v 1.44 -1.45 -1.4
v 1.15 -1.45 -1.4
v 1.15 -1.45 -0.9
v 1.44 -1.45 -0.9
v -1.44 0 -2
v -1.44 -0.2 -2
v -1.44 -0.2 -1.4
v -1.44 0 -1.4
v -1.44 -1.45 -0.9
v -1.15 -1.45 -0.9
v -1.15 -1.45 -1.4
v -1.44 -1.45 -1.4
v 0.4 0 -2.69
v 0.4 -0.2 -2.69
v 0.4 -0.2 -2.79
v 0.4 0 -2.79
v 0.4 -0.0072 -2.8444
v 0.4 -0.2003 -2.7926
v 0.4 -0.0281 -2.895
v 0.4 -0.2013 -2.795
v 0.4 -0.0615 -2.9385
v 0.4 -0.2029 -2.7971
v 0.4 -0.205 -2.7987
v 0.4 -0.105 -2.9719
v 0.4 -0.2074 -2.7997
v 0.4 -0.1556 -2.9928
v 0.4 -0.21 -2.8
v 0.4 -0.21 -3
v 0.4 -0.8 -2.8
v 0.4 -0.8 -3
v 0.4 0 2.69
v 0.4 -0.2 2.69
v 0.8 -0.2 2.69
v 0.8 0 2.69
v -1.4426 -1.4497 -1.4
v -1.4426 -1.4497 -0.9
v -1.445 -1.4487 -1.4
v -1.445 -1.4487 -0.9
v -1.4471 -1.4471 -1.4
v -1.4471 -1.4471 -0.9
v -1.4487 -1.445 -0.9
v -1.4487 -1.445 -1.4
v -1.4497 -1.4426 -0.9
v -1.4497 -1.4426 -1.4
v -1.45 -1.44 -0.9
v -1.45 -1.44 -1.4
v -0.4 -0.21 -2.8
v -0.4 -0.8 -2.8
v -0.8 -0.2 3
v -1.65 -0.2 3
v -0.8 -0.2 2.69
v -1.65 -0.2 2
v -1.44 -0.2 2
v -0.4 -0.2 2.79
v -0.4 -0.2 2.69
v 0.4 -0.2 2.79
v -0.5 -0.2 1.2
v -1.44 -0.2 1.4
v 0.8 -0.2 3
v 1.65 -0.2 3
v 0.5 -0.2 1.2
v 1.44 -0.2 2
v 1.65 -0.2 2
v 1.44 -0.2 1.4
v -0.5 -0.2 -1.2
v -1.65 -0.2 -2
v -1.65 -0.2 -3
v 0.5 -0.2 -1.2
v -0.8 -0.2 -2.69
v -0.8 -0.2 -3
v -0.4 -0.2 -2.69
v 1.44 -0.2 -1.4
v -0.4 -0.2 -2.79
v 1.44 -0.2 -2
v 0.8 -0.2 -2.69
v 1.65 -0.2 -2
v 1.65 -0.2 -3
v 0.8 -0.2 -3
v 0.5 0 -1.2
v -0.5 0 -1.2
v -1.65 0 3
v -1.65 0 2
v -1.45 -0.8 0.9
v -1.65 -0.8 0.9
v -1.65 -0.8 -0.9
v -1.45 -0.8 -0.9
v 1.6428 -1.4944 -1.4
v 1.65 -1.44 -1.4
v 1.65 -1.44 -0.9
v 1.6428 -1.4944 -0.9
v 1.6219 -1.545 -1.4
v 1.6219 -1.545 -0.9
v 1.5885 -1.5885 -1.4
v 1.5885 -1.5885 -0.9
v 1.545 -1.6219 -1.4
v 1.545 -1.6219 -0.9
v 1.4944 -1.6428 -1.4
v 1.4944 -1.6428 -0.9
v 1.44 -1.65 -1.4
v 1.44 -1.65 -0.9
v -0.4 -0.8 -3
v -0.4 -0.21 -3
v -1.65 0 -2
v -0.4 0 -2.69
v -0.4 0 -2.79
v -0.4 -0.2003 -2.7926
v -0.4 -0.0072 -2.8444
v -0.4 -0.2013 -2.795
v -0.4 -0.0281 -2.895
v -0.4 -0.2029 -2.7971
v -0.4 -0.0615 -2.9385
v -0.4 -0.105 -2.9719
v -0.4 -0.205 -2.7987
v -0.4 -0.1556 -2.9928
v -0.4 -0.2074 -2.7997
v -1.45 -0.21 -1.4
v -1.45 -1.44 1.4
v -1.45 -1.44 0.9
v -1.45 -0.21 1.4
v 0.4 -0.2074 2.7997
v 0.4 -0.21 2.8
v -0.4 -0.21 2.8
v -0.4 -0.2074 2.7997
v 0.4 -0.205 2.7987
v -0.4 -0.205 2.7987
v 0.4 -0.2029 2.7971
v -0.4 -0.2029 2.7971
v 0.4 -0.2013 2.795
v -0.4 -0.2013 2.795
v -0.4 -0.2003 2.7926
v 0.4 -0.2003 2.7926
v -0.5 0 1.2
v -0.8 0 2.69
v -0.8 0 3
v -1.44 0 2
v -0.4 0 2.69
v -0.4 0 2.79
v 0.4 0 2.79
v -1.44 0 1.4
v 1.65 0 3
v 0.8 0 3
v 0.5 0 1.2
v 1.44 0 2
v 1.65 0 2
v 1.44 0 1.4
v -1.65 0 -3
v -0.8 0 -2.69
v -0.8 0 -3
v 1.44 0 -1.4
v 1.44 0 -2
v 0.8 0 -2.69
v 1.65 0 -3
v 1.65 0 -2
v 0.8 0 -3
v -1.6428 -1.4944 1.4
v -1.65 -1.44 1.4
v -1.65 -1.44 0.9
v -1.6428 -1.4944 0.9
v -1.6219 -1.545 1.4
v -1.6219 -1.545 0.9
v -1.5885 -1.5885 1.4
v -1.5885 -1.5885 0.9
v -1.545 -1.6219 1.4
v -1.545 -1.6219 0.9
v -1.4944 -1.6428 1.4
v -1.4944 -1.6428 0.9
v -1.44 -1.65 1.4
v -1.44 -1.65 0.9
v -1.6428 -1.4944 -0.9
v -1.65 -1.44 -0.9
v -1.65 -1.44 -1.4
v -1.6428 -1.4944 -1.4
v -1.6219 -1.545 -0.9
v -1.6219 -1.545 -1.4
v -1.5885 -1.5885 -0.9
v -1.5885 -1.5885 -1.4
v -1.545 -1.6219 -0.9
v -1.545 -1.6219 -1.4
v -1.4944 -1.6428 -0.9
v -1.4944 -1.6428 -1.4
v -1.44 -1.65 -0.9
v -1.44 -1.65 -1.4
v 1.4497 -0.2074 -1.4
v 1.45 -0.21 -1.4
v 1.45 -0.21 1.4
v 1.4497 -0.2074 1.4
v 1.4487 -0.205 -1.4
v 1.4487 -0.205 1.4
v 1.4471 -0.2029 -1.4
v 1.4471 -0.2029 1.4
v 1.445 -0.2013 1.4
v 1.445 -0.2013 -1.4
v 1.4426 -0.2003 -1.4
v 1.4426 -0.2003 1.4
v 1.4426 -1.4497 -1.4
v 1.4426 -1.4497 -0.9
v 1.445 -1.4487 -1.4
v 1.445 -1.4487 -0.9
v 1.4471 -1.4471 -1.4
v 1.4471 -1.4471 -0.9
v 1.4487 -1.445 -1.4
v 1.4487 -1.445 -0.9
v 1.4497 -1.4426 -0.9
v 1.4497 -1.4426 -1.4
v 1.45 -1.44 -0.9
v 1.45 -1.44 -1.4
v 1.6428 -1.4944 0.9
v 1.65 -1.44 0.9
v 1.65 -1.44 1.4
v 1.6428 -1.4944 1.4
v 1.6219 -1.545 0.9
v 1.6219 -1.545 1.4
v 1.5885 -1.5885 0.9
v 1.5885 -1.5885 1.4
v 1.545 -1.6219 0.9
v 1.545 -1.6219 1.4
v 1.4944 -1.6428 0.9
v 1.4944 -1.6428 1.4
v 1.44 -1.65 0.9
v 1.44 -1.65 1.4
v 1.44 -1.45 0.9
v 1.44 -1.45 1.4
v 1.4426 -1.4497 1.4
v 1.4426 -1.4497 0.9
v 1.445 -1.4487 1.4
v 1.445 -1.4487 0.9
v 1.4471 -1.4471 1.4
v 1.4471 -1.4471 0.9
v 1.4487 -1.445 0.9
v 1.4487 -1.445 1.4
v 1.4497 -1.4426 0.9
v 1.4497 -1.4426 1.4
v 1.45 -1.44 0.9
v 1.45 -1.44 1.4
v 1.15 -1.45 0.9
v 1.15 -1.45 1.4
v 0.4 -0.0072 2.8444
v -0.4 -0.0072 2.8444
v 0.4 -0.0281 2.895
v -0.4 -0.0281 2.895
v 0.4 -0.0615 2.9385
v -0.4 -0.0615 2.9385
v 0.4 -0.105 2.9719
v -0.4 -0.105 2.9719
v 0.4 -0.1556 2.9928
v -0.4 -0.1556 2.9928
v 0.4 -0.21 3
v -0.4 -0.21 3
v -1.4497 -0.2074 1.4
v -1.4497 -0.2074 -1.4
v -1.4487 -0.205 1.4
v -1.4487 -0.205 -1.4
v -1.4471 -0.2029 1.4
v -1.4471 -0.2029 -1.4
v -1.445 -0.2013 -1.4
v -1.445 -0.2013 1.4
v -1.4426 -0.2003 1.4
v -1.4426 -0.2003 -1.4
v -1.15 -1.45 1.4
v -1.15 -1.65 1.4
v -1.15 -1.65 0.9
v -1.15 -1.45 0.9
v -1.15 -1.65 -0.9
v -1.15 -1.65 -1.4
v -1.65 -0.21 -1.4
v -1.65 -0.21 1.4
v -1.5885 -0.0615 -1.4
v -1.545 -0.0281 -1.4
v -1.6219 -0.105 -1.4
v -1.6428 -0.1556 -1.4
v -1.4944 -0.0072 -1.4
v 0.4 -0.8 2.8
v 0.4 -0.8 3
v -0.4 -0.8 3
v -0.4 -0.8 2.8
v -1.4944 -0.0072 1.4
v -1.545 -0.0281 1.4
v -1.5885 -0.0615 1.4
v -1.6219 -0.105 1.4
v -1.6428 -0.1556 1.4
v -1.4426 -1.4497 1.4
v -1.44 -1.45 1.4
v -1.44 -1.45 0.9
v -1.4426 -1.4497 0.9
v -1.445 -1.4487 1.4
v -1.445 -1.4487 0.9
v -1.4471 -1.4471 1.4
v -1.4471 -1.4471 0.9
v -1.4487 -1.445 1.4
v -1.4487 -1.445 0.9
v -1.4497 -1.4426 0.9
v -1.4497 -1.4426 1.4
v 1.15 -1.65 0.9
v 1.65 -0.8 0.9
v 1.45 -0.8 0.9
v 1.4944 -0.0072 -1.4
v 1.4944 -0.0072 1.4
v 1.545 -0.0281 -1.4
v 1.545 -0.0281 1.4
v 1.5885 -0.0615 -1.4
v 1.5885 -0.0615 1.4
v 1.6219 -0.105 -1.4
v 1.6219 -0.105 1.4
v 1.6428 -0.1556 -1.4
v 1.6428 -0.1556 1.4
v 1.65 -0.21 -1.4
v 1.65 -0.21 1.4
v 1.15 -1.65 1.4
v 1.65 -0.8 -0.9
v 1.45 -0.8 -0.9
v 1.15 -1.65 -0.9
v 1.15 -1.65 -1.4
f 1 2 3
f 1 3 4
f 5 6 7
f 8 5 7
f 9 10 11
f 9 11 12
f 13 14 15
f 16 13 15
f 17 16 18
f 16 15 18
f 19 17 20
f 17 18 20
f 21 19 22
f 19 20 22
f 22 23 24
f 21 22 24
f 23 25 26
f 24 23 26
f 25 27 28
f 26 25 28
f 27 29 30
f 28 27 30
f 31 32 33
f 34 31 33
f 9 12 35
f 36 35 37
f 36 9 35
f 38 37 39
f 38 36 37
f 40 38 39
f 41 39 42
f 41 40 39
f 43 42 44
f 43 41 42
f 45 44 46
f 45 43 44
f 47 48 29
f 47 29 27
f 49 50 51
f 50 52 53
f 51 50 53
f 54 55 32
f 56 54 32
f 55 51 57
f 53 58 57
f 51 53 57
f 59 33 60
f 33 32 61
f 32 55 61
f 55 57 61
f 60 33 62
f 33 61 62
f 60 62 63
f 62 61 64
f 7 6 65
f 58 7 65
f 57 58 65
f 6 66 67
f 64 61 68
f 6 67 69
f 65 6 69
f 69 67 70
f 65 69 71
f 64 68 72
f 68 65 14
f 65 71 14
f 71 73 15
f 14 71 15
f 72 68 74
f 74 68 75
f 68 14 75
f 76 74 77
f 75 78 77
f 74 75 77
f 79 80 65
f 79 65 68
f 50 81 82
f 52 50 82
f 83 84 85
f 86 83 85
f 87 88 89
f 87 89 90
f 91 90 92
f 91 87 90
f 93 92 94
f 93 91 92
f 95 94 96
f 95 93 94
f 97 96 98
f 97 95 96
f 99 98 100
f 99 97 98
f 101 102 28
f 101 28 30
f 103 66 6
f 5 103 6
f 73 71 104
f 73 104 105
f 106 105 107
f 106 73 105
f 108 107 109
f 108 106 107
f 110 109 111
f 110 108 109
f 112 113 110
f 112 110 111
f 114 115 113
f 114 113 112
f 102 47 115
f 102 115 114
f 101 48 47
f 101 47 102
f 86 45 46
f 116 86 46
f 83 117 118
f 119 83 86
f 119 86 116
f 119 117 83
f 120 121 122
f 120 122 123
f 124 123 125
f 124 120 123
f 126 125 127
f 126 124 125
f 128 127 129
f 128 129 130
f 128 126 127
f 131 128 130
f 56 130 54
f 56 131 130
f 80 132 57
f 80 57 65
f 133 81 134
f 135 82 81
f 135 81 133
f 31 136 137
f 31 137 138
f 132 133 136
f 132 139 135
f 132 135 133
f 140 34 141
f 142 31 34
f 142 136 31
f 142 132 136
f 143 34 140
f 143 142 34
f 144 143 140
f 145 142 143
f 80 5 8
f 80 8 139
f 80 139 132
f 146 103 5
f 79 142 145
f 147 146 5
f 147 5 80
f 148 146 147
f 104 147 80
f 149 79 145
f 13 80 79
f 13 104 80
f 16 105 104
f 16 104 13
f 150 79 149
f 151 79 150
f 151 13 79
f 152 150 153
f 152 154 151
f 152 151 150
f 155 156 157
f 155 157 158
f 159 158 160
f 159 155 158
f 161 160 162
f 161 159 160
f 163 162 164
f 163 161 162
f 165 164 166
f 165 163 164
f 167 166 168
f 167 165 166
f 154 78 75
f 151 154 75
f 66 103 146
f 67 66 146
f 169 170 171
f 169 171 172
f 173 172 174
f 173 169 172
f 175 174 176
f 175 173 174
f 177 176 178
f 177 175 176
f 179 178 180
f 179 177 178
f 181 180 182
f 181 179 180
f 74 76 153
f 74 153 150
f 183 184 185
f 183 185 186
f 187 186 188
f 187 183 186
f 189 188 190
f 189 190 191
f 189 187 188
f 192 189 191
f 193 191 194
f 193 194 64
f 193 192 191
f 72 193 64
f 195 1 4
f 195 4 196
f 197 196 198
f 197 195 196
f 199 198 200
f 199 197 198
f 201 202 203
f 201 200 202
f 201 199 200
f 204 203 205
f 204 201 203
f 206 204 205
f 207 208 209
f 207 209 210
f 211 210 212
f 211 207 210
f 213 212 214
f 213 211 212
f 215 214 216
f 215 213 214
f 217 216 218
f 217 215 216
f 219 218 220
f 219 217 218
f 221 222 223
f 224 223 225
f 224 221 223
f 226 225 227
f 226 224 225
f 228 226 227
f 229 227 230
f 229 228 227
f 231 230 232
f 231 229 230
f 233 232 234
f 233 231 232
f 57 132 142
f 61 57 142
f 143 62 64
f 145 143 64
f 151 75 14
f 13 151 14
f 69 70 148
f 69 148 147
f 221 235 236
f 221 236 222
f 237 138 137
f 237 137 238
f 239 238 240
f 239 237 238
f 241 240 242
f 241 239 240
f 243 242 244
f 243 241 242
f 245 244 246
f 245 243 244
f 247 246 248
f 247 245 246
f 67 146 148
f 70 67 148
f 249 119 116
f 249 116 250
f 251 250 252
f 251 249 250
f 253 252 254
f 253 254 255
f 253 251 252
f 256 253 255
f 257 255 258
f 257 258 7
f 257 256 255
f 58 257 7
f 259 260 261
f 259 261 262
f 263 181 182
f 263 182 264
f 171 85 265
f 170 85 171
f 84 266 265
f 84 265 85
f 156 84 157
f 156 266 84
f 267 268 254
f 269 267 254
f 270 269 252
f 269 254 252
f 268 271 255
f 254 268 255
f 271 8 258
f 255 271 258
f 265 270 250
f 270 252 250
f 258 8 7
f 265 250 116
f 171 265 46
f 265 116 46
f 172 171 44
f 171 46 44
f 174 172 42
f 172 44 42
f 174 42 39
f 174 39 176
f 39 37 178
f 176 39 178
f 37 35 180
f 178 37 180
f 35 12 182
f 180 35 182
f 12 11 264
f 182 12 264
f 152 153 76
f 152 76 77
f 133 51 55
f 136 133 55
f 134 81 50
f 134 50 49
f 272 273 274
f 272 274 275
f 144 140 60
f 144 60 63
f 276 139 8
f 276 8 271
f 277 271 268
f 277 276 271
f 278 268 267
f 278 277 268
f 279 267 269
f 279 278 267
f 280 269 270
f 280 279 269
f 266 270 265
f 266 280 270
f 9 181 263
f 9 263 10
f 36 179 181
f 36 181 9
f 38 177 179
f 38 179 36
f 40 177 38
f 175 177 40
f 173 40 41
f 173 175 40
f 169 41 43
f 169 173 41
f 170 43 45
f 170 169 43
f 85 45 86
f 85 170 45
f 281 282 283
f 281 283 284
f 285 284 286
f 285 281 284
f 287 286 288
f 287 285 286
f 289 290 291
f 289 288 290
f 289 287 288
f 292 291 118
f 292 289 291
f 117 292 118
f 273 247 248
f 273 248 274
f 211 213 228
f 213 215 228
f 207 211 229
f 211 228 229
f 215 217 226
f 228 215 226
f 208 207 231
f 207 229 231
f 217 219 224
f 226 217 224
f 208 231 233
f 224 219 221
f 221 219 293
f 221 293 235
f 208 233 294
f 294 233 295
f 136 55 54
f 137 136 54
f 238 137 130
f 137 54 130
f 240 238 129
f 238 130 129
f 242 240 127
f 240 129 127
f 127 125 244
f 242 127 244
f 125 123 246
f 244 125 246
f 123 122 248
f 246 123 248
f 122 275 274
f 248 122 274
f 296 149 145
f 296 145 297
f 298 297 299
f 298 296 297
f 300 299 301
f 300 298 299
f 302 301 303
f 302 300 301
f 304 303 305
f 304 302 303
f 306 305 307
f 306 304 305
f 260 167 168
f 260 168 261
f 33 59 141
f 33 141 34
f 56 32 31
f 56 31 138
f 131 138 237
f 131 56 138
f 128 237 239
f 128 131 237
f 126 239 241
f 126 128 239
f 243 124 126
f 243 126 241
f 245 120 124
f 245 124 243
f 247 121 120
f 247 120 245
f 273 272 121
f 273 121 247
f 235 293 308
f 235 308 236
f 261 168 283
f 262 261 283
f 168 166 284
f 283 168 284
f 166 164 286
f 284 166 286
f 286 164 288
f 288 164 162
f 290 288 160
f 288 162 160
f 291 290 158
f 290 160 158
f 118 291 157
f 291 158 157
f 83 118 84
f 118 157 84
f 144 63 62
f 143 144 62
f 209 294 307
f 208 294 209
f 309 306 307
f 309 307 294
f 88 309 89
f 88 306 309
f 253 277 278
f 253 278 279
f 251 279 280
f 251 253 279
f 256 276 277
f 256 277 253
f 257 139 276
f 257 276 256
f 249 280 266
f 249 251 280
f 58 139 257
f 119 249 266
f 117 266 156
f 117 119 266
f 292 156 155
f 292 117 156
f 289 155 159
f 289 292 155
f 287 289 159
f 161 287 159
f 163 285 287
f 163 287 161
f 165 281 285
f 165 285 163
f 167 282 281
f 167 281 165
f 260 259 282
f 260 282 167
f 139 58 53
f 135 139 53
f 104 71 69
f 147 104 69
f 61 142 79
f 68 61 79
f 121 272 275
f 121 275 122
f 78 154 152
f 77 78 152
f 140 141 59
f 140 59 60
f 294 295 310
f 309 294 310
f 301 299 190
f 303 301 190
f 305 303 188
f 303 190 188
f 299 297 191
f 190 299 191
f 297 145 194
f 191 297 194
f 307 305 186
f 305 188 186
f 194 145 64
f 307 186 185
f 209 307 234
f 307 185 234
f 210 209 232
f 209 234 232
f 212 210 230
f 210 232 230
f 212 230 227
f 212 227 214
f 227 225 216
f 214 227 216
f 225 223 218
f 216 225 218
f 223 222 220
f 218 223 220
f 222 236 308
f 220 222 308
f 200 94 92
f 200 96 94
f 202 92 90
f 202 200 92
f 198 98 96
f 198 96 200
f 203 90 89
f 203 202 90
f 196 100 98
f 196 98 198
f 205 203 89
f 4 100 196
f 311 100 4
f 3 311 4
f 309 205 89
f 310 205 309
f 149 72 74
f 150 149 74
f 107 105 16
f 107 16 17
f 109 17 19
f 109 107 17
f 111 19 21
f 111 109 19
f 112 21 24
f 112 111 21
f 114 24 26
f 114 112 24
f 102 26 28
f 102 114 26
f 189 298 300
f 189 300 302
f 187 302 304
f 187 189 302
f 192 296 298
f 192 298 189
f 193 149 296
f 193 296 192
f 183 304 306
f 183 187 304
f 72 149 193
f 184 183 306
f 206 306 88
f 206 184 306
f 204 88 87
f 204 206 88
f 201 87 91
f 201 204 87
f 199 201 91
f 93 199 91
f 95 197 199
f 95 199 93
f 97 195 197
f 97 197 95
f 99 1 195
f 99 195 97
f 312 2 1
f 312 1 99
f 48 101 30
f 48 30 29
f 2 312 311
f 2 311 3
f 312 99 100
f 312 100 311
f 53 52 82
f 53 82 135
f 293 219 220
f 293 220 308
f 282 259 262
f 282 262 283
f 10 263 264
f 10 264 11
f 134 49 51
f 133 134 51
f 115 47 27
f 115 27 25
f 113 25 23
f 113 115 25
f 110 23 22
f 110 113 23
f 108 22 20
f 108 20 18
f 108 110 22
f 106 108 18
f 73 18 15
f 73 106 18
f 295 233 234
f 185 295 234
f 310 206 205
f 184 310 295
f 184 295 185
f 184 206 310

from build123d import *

# Parameters (mm, degrees)
SKETCH1_W                       = 3.3
SKETCH1_H                       = 6
BASE_FLANGE1_DEPTH              = 0.2
EDGE_FLANGE1_STRIP_W            = 0.82
EDGE_FLANGE1_STRIP_H            = 0.2
EDGE_FLANGE1_STRIP_CUT_DEPTH    = 0.8
EDGE_FLANGE1_RELIEF_W           = 0.92
EDGE_FLANGE1_RELIEF_H           = 0.4
EDGE_FLANGE1_RELIEF_CUT_DEPTH   = 0.2
EDGE_FLANGE1_STRIP_2_W          = 0.82
EDGE_FLANGE1_STRIP_2_H          = 0.2
EDGE_FLANGE1_STRIP_CUT_2_DEPTH  = 0.8
EDGE_FLANGE1_RELIEF_2_W         = 0.92
EDGE_FLANGE1_RELIEF_2_H         = 0.4
EDGE_FLANGE1_RELIEF_CUT_2_DEPTH = 0.2
EDGE_FLANGE1_DEPTH              = 0.8
EDGE_FLANGE1_BEND_DEPTH         = 0.8
EDGE_FLANGE2_STRIP_W            = 0.82
EDGE_FLANGE2_STRIP_H            = 0.2
EDGE_FLANGE2_STRIP_CUT_DEPTH    = 2.8
EDGE_FLANGE2_RELIEF_W           = 0.82
EDGE_FLANGE2_RELIEF_H           = 0.6
EDGE_FLANGE2_RELIEF_CUT_DEPTH   = 0.2
EDGE_FLANGE2_STRIP_2_W          = 0.82
EDGE_FLANGE2_STRIP_2_H          = 0.2
EDGE_FLANGE2_STRIP_CUT_2_DEPTH  = 2.8
EDGE_FLANGE2_RELIEF_2_W         = 0.82
EDGE_FLANGE2_RELIEF_2_H         = 0.6
EDGE_FLANGE2_RELIEF_CUT_2_DEPTH = 0.2
EDGE_FLANGE2_DEPTH              = 2.8
EDGE_FLANGE2_BEND_DEPTH         = 2.8
EDGE_FLANGE3_STRIP_W            = 0.82
EDGE_FLANGE3_STRIP_H            = 0.2
EDGE_FLANGE3_STRIP_CUT_DEPTH    = 2.8
EDGE_FLANGE3_STRIP_2_W          = 0.82
EDGE_FLANGE3_STRIP_2_H          = 0.2
EDGE_FLANGE3_STRIP_CUT_2_DEPTH  = 2.8
EDGE_FLANGE3_DEPTH              = 2.8
EDGE_FLANGE3_BEND_DEPTH         = 2.8
CUT_EXTRUDE1_DEPTH              = 10
CUT_EXTRUDE1_DEPTH_BACK         = 10
SKETCH23_W                      = 1.8
SKETCH23_H                      = 0.85
SKETCH24_W                      = 1
SKETCH24_H                      = 2.4
CUT_EXTRUDE2_DEPTH              = 10


# Sheet-metal steps are written as plain solids
with BuildPart() as part:
    # Sketch1 → Base-Flange1 (new body)
    with BuildSketch(Plane(origin=(0, 0, 0), x_dir=(1, 0, 0), z_dir=(0, 1, 0))):
        Rectangle(SKETCH1_W, SKETCH1_H)
    extrude(amount=-BASE_FLANGE1_DEPTH)

    # Edge-Flange1 strip (across the edge) → Edge-Flange1 strip cut (cut)
    with BuildSketch(Plane(origin=(0.4, -0.2, 3), x_dir=(0, 0, -1), z_dir=(-1, 0, 0))):
        with Locations((-0.2, -0.1)):
            Rectangle(EDGE_FLANGE1_STRIP_W, EDGE_FLANGE1_STRIP_H)
    extrude(amount=EDGE_FLANGE1_STRIP_CUT_DEPTH, mode=Mode.SUBTRACT)

    # Edge-Flange1 relief (on the sheet) → Edge-Flange1 relief cut (cut)
    with BuildSketch(Plane(origin=(0.4, -0.2, 2.79), x_dir=(0, 0, -1), z_dir=(0, -1, 0))):
        with Locations((-0.36, 0.2)):
            Rectangle(EDGE_FLANGE1_RELIEF_W, EDGE_FLANGE1_RELIEF_H)
        with Locations((-0.36, -1)):
            Rectangle(EDGE_FLANGE1_RELIEF_W, EDGE_FLANGE1_RELIEF_H)
    extrude(amount=-EDGE_FLANGE1_RELIEF_CUT_DEPTH, mode=Mode.SUBTRACT)

    # Edge-Flange1 strip 2 (across the edge) → Edge-Flange1 strip cut 2 (cut)
    with BuildSketch(Plane(origin=(-0.4, -0.2, -3), x_dir=(0, 0, 1), z_dir=(1, 0, 0))):
        with Locations((-0.2, -0.1)):
            Rectangle(EDGE_FLANGE1_STRIP_2_W, EDGE_FLANGE1_STRIP_2_H)
    extrude(amount=EDGE_FLANGE1_STRIP_CUT_2_DEPTH, mode=Mode.SUBTRACT)

    # Edge-Flange1 relief 2 (on the sheet) → Edge-Flange1 relief cut 2 (cut)
    with BuildSketch(Plane(origin=(-0.4, -0.2, -2.79), x_dir=(0, 0, 1), z_dir=(0, -1, 0))):
        with Locations((-0.36, 0.2)):
            Rectangle(EDGE_FLANGE1_RELIEF_2_W, EDGE_FLANGE1_RELIEF_2_H)
        with Locations((-0.36, -1)):
            Rectangle(EDGE_FLANGE1_RELIEF_2_W, EDGE_FLANGE1_RELIEF_2_H)
    extrude(amount=-EDGE_FLANGE1_RELIEF_CUT_2_DEPTH, mode=Mode.SUBTRACT)

    # Edge-Flange1 section (across the edge) → Edge-Flange1 (add)
    with BuildSketch(Plane(origin=(0.4, -0.2, 3), x_dir=(0, 0, -1), z_dir=(-1, 0, 0))):
        with BuildLine():
            Line((0, 0.01), (0, 0.6))
            Line((0, 0.6), (0.2, 0.6))
            Line((0.2, 0.6), (0.2, 0.01))
            ThreePointArc((0.2, 0.01), (0.202928932, 0.002928932), (0.21, 0))
            Line((0.21, 0), (0.21, -0.2))
            ThreePointArc((0.21, -0.2), (0.061507576, -0.138492424), (0, 0.01))
        make_face()
    extrude(amount=EDGE_FLANGE1_DEPTH)

    # Edge-Flange1 section 2 (across the edge) → Edge-Flange1 bend (add)
    with BuildSketch(Plane(origin=(-0.4, -0.2, -3), x_dir=(0, 0, 1), z_dir=(1, 0, 0))):
        with BuildLine():
            Line((0, 0.01), (0, 0.6))
            Line((0, 0.6), (0.2, 0.6))
            Line((0.2, 0.6), (0.2, 0.01))
            ThreePointArc((0.2, 0.01), (0.202928932, 0.002928932), (0.21, 0))
            Line((0.21, 0), (0.21, -0.2))
            ThreePointArc((0.21, -0.2), (0.061507576, -0.138492424), (0, 0.01))
        make_face()
    extrude(amount=EDGE_FLANGE1_BEND_DEPTH)

    # Edge-Flange2 strip (across the edge) → Edge-Flange2 strip cut (cut)
    with BuildSketch(Plane(origin=(-1.65, -0.2, 1.4), x_dir=(1, 0, 0), z_dir=(0, 0, -1))):
        with Locations((-0.2, -0.1)):
            Rectangle(EDGE_FLANGE2_STRIP_W, EDGE_FLANGE2_STRIP_H)
    extrude(amount=EDGE_FLANGE2_STRIP_CUT_DEPTH, mode=Mode.SUBTRACT)

    # Edge-Flange2 relief (on the sheet) → Edge-Flange2 relief cut (cut)
    with BuildSketch(Plane(origin=(-1.44, -0.2, 1.4), x_dir=(1, 0, 0), z_dir=(0, -1, 0))):
        with Locations((-0.41, 0.3)):
            Rectangle(EDGE_FLANGE2_RELIEF_W, EDGE_FLANGE2_RELIEF_H)
        with Locations((-0.41, -3.1)):
            Rectangle(EDGE_FLANGE2_RELIEF_W, EDGE_FLANGE2_RELIEF_H)
    extrude(amount=-EDGE_FLANGE2_RELIEF_CUT_DEPTH, mode=Mode.SUBTRACT)

    # Edge-Flange2 strip 2 (across the edge) → Edge-Flange2 strip cut 2 (cut)
    with BuildSketch(Plane(origin=(1.65, -0.2, -1.4), x_dir=(-1, 0, 0), z_dir=(0, 0, 1))):
        with Locations((-0.2, -0.1)):
            Rectangle(EDGE_FLANGE2_STRIP_2_W, EDGE_FLANGE2_STRIP_2_H)
    extrude(amount=EDGE_FLANGE2_STRIP_CUT_2_DEPTH, mode=Mode.SUBTRACT)

    # Edge-Flange2 relief 2 (on the sheet) → Edge-Flange2 relief cut 2 (cut)
    with BuildSketch(Plane(origin=(1.44, -0.2, -1.4), x_dir=(-1, 0, 0), z_dir=(0, -1, 0))):
        with Locations((-0.41, 0.3)):
            Rectangle(EDGE_FLANGE2_RELIEF_2_W, EDGE_FLANGE2_RELIEF_2_H)
        with Locations((-0.41, -3.1)):
            Rectangle(EDGE_FLANGE2_RELIEF_2_W, EDGE_FLANGE2_RELIEF_2_H)
    extrude(amount=-EDGE_FLANGE2_RELIEF_CUT_2_DEPTH, mode=Mode.SUBTRACT)

    # Edge-Flange2 section (across the edge) → Edge-Flange2 (add)
    with BuildSketch(Plane(origin=(-1.65, -0.2, 1.4), x_dir=(1, 0, 0), z_dir=(0, 0, -1))):
        with BuildLine():
            Line((0, 0.01), (0, 1.45))
            Line((0, 1.45), (0.2, 1.45))
            Line((0.2, 1.45), (0.2, 0.01))
            ThreePointArc((0.2, 0.01), (0.202928932, 0.002928932), (0.21, 0))
            Line((0.21, 0), (0.21, -0.2))
            ThreePointArc((0.21, -0.2), (0.061507576, -0.138492424), (0, 0.01))
        make_face()
    extrude(amount=EDGE_FLANGE2_DEPTH)

    # Edge-Flange2 section 2 (across the edge) → Edge-Flange2 bend (add)
    with BuildSketch(Plane(origin=(1.65, -0.2, -1.4), x_dir=(-1, 0, 0), z_dir=(0, 0, 1))):
        with BuildLine():
            Line((0, 0.01), (0, 1.45))
            Line((0, 1.45), (0.2, 1.45))
            Line((0.2, 1.45), (0.2, 0.01))
            ThreePointArc((0.2, 0.01), (0.202928932, 0.002928932), (0.21, 0))
            Line((0.21, 0), (0.21, -0.2))
            ThreePointArc((0.21, -0.2), (0.061507576, -0.138492424), (0, 0.01))
        make_face()
    extrude(amount=EDGE_FLANGE2_BEND_DEPTH)

    # Edge-Flange3 strip (across the edge) → Edge-Flange3 strip cut (cut)
    with BuildSketch(Plane(origin=(-1.45, -1.65, 1.4), x_dir=(0, 1, 0), z_dir=(0, 0, -1))):
        with Locations((-0.2, -0.1)):
            Rectangle(EDGE_FLANGE3_STRIP_W, EDGE_FLANGE3_STRIP_H)
    extrude(amount=EDGE_FLANGE3_STRIP_CUT_DEPTH, mode=Mode.SUBTRACT)

    # Edge-Flange3 strip 2 (across the edge) → Edge-Flange3 strip cut 2 (cut)
    with BuildSketch(Plane(origin=(1.45, -1.65, -1.4), x_dir=(0, 1, 0), z_dir=(0, 0, 1))):
        with Locations((-0.2, -0.1)):
            Rectangle(EDGE_FLANGE3_STRIP_2_W, EDGE_FLANGE3_STRIP_2_H)
    extrude(amount=EDGE_FLANGE3_STRIP_CUT_2_DEPTH, mode=Mode.SUBTRACT)

    # Edge-Flange3 section (across the edge) → Edge-Flange3 (add)
    with BuildSketch(Plane(origin=(-1.45, -1.65, 1.4), x_dir=(0, 1, 0), z_dir=(0, 0, -1))):
        with BuildLine():
            Line((0, 0.01), (0, 0.3))
            Line((0, 0.3), (0.2, 0.3))
            Line((0.2, 0.3), (0.2, 0.01))
            ThreePointArc((0.2, 0.01), (0.202928932, 0.002928932), (0.21, 0))
            Line((0.21, 0), (0.21, -0.2))
            ThreePointArc((0.21, -0.2), (0.061507576, -0.138492424), (0, 0.01))
        make_face()
    extrude(amount=EDGE_FLANGE3_DEPTH)

    # Edge-Flange3 section 2 (across the edge) → Edge-Flange3 bend (add)
    with BuildSketch(Plane(origin=(1.45, -1.65, -1.4), x_dir=(0, 1, 0), z_dir=(0, 0, 1))):
        with BuildLine():
            Line((0, 0.01), (0, 0.3))
            Line((0, 0.3), (0.2, 0.3))
            Line((0.2, 0.3), (0.2, 0.01))
            ThreePointArc((0.2, 0.01), (0.202928932, 0.002928932), (0.21, 0))
            Line((0.21, 0), (0.21, -0.2))
            ThreePointArc((0.21, -0.2), (0.061507576, -0.138492424), (0, 0.01))
        make_face()
    extrude(amount=EDGE_FLANGE3_BEND_DEPTH)

    # Sketch23 → Cut-Extrude1 (cut, two sides: drawn at the far end of the back side and taken through both)
    with BuildSketch(Plane(origin=(0, 0, 0), x_dir=(0, 0, -1), z_dir=(1, 0, 0)).offset(-CUT_EXTRUDE1_DEPTH_BACK)):
        with Locations((0, -1.225)):
            Rectangle(SKETCH23_W, SKETCH23_H)
    extrude(amount=CUT_EXTRUDE1_DEPTH + CUT_EXTRUDE1_DEPTH_BACK, mode=Mode.SUBTRACT)

    # Sketch24 → Cut-Extrude2 (cut)
    with BuildSketch(Plane(origin=(0, 0, 0), x_dir=(1, 0, 0), z_dir=(0, 1, 0))):
        Rectangle(SKETCH24_W, SKETCH24_H)
    extrude(amount=-CUT_EXTRUDE2_DEPTH, mode=Mode.SUBTRACT)


solid = part.part
